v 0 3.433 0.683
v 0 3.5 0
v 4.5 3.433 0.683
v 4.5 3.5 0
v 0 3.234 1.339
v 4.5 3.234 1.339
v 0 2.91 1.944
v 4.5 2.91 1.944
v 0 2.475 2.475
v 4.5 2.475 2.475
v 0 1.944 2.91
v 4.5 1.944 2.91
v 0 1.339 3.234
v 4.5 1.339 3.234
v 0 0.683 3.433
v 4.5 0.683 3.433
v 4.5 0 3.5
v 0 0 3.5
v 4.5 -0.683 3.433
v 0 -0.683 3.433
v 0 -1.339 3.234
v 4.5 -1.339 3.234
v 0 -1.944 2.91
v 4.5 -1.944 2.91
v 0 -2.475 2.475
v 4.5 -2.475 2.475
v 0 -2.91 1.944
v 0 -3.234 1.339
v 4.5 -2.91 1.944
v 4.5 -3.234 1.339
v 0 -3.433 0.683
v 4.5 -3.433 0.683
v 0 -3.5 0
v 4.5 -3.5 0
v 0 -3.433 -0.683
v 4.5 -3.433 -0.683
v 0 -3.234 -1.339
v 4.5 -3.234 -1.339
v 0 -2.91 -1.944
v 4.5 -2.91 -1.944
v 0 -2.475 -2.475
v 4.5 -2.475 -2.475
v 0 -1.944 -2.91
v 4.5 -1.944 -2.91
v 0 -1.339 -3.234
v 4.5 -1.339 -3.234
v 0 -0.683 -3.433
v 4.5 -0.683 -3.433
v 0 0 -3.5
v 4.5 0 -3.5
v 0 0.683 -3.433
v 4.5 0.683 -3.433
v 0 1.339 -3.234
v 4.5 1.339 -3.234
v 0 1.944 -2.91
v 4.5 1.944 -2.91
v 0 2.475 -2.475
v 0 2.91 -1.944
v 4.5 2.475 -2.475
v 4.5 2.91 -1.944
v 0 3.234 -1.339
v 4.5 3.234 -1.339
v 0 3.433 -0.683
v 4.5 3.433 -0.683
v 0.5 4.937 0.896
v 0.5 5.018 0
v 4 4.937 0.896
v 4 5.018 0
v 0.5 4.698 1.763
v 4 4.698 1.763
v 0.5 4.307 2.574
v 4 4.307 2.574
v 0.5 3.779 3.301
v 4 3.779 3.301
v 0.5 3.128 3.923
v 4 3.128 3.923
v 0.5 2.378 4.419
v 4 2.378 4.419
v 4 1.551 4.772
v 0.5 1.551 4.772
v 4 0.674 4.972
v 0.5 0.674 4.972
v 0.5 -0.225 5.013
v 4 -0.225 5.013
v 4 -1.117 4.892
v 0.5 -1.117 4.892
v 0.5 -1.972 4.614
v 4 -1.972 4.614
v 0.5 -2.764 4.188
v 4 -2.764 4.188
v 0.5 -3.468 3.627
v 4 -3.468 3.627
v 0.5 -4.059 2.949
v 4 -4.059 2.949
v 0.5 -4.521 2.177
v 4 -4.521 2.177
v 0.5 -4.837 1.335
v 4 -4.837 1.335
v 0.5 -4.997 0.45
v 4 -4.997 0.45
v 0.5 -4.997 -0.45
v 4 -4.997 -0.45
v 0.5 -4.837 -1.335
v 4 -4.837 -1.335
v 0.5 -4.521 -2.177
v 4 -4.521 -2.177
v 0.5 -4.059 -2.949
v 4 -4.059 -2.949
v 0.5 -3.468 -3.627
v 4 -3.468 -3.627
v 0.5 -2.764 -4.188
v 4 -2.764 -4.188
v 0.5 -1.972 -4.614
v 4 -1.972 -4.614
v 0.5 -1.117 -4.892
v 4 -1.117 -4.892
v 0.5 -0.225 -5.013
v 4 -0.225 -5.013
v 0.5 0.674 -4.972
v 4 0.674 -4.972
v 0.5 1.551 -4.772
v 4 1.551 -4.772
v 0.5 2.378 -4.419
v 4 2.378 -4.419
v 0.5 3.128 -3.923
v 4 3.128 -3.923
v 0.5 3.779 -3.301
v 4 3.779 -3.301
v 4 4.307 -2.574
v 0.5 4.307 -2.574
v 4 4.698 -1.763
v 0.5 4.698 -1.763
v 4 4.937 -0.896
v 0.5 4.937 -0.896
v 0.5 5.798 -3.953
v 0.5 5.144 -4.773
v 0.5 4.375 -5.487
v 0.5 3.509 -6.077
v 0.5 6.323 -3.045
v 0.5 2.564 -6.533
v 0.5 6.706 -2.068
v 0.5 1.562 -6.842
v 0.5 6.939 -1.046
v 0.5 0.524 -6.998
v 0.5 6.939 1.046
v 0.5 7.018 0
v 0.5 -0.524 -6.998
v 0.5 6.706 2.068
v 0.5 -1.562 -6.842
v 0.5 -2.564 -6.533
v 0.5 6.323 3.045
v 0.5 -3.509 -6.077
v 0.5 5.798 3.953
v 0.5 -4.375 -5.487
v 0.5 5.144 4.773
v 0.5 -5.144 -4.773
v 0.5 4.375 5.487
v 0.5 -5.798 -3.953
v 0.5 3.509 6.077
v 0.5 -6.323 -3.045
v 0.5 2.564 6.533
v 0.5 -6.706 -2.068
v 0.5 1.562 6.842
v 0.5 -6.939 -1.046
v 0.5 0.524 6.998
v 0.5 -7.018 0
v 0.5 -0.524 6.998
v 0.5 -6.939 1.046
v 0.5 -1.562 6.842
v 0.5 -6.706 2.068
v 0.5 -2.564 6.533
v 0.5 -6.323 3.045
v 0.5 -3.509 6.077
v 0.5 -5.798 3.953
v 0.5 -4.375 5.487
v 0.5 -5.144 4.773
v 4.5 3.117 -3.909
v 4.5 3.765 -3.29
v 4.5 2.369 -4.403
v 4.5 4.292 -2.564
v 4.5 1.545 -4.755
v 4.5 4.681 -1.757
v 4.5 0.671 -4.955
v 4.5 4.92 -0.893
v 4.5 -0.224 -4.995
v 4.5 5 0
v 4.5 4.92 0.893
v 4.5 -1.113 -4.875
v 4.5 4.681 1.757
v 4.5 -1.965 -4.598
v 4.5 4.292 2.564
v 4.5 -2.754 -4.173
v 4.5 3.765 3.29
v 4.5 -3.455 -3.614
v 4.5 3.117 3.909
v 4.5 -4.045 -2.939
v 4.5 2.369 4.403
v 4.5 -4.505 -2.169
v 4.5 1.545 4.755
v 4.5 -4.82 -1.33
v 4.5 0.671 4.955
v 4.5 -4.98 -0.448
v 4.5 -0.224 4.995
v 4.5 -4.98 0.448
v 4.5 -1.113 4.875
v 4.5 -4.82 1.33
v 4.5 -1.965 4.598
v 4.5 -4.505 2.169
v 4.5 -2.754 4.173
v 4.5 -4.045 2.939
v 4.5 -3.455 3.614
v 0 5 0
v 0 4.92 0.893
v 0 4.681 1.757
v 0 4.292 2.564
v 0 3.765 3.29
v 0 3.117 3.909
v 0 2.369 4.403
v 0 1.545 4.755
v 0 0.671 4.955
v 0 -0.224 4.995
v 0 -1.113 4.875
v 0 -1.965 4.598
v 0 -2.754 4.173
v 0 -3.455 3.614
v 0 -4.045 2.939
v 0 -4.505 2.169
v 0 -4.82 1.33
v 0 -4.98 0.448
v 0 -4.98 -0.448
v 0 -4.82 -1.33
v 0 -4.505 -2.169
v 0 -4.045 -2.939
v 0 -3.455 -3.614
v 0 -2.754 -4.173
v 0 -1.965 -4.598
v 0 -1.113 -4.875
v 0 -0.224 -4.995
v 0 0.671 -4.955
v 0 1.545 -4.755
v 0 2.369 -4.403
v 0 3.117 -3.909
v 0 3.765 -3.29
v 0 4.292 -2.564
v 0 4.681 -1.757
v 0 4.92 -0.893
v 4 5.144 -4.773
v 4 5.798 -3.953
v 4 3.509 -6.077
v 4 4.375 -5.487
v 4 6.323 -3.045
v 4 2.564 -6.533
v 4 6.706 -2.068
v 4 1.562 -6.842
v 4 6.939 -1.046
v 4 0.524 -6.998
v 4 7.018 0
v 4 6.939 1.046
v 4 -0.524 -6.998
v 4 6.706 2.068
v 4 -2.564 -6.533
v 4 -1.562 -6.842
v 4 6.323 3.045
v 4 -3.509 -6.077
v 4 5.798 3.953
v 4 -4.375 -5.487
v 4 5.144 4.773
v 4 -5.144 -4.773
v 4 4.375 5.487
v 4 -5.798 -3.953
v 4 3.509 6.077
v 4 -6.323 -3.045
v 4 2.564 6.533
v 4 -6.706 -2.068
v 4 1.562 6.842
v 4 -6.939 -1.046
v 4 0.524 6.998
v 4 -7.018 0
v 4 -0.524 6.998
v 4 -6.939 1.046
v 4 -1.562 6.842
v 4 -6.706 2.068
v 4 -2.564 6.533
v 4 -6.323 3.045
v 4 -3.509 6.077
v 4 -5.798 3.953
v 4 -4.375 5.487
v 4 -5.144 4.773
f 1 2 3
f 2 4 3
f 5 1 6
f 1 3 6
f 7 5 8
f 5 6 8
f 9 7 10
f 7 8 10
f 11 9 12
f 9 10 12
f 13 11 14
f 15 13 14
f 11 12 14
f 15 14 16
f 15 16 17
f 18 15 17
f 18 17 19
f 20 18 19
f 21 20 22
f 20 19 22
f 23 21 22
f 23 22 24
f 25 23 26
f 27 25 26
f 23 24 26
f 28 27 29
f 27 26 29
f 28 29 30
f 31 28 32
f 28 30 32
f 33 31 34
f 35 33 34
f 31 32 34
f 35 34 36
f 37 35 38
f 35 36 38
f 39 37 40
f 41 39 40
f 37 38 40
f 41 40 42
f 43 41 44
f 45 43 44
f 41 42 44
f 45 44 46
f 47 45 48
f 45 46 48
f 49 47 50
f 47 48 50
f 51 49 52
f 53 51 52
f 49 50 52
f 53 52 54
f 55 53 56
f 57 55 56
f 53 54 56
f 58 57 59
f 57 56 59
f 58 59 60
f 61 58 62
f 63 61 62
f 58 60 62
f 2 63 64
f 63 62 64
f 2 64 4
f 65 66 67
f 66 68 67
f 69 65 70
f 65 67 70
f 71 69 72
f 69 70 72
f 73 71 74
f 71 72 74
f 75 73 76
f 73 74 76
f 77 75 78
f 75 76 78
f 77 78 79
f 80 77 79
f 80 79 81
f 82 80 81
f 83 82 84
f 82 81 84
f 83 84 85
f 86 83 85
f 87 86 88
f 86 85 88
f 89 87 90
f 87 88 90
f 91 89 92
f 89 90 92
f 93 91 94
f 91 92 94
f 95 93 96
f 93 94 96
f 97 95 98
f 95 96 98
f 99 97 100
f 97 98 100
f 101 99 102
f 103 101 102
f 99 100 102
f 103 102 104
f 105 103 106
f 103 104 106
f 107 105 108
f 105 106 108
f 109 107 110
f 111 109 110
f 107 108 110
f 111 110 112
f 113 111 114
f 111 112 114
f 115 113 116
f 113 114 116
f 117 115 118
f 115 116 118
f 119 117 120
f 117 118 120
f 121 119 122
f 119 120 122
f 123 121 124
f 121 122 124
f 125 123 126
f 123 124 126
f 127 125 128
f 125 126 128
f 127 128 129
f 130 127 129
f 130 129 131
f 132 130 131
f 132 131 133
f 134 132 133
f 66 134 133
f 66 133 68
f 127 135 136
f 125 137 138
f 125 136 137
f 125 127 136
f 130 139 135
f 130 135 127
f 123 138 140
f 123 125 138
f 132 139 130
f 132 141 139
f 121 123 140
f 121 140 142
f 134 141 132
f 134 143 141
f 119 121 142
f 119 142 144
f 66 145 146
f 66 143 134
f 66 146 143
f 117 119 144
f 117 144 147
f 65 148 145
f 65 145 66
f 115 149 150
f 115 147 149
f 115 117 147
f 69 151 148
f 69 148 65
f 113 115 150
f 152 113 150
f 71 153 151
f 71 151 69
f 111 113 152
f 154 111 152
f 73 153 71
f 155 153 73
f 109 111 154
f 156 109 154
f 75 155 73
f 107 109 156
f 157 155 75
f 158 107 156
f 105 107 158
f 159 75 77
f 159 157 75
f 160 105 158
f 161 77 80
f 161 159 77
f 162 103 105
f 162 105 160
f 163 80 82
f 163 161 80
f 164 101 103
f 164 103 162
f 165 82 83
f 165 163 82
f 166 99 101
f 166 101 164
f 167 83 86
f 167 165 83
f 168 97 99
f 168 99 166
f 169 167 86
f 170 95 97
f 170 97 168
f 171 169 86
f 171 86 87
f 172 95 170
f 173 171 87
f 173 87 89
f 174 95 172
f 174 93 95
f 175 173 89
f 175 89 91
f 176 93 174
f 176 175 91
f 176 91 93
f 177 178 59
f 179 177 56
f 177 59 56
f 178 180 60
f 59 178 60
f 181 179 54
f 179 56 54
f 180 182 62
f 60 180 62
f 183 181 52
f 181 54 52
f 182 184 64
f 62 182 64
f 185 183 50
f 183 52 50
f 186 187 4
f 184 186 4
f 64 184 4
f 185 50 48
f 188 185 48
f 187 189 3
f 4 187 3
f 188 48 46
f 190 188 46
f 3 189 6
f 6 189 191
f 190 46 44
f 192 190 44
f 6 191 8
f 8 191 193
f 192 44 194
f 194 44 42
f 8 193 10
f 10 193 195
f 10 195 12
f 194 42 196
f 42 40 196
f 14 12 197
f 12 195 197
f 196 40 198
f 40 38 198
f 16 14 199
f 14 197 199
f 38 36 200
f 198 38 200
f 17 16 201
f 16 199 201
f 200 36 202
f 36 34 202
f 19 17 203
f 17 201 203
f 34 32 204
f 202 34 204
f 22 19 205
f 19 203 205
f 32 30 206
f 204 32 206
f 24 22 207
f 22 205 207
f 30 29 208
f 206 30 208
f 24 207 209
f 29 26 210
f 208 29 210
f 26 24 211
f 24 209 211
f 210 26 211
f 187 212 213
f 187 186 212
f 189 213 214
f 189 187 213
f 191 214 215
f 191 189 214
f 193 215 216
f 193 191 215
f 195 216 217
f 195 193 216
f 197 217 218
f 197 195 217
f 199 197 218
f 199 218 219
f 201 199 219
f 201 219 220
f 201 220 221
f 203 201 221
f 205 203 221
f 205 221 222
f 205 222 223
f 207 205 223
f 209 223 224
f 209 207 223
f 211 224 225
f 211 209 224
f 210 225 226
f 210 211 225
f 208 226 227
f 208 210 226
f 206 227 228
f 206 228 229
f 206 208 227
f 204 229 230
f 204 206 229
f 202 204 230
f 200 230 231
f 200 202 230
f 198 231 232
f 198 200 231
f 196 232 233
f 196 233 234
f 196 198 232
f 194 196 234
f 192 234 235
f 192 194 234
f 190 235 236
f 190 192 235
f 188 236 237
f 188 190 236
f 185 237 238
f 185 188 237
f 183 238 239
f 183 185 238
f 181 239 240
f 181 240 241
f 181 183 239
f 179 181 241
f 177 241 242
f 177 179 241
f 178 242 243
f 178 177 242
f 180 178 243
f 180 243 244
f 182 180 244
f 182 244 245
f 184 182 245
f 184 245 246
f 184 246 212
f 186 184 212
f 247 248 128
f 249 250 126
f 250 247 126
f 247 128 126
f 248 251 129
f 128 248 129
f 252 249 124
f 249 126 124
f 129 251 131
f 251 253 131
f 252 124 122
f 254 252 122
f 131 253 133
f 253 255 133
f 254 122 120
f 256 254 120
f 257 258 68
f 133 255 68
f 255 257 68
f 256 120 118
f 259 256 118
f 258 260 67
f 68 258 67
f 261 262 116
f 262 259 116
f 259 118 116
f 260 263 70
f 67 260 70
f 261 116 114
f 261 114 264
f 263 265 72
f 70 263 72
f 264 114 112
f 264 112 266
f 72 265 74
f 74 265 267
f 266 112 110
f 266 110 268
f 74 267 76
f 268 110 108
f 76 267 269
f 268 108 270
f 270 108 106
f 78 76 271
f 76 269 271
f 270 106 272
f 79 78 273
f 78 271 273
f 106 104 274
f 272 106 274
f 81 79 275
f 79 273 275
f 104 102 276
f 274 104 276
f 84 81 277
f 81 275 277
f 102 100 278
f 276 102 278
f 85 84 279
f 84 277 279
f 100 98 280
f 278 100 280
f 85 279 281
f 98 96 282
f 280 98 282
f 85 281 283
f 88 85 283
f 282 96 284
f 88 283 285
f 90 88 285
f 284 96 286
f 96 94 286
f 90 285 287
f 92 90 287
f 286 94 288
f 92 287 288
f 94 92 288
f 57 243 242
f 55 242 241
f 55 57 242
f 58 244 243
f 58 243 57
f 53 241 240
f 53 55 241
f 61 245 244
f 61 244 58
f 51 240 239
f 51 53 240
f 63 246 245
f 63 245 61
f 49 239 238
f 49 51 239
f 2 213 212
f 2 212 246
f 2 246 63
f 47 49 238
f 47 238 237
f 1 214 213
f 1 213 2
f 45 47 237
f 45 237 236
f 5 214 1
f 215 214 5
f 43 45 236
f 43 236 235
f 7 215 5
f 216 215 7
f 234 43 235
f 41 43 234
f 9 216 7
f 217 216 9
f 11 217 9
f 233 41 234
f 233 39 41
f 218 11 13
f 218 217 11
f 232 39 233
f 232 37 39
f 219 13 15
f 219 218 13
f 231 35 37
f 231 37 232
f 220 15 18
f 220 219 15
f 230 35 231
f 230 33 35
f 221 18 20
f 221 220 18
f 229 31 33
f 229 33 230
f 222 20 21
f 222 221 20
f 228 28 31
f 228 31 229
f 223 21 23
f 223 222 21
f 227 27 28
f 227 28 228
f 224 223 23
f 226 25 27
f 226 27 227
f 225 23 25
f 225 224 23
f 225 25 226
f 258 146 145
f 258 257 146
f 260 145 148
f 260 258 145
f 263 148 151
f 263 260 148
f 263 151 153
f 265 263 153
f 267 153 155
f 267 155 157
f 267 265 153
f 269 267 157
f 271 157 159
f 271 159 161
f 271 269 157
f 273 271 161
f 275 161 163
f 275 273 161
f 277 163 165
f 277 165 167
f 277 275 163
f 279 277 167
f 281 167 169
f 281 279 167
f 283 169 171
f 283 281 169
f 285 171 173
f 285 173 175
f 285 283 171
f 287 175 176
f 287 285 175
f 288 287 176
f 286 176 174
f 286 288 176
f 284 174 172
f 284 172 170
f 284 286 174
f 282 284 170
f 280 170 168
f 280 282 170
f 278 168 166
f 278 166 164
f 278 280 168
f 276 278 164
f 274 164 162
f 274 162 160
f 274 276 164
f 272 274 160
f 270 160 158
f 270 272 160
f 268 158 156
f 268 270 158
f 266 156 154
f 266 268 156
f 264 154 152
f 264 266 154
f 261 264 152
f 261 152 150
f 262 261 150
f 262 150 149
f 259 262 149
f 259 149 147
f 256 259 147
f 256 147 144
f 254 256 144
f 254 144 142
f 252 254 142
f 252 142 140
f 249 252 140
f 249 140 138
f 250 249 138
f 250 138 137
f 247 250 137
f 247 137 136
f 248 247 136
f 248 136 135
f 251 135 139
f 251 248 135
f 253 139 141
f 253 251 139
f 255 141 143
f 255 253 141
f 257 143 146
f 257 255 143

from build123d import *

# Parameters (mm, degrees)
F0_W = 4.5
F0_H = 1.5
F1_W = 3.5
F1_H = 2


with BuildPart() as f2:
    # F0 (on Top) → F2 (revolve)
    with BuildSketch(Plane.XY):
        with Locations((2.25, 4.25)):
            Rectangle(F0_W, F0_H)
    revolve(axis=Axis((2.25, 0, 0), (1, 0, 0)))


with BuildPart() as f3:
    # F1 (on Top) → F3 (revolve)
    with BuildSketch(Plane.XY):
        with Locations((2.25, 6.017642)):
            Rectangle(F1_W, F1_H)
    revolve(axis=Axis((2.25, 0, 0), (1, 0, 0)))


solid = Compound([f2.part, f3.part])
